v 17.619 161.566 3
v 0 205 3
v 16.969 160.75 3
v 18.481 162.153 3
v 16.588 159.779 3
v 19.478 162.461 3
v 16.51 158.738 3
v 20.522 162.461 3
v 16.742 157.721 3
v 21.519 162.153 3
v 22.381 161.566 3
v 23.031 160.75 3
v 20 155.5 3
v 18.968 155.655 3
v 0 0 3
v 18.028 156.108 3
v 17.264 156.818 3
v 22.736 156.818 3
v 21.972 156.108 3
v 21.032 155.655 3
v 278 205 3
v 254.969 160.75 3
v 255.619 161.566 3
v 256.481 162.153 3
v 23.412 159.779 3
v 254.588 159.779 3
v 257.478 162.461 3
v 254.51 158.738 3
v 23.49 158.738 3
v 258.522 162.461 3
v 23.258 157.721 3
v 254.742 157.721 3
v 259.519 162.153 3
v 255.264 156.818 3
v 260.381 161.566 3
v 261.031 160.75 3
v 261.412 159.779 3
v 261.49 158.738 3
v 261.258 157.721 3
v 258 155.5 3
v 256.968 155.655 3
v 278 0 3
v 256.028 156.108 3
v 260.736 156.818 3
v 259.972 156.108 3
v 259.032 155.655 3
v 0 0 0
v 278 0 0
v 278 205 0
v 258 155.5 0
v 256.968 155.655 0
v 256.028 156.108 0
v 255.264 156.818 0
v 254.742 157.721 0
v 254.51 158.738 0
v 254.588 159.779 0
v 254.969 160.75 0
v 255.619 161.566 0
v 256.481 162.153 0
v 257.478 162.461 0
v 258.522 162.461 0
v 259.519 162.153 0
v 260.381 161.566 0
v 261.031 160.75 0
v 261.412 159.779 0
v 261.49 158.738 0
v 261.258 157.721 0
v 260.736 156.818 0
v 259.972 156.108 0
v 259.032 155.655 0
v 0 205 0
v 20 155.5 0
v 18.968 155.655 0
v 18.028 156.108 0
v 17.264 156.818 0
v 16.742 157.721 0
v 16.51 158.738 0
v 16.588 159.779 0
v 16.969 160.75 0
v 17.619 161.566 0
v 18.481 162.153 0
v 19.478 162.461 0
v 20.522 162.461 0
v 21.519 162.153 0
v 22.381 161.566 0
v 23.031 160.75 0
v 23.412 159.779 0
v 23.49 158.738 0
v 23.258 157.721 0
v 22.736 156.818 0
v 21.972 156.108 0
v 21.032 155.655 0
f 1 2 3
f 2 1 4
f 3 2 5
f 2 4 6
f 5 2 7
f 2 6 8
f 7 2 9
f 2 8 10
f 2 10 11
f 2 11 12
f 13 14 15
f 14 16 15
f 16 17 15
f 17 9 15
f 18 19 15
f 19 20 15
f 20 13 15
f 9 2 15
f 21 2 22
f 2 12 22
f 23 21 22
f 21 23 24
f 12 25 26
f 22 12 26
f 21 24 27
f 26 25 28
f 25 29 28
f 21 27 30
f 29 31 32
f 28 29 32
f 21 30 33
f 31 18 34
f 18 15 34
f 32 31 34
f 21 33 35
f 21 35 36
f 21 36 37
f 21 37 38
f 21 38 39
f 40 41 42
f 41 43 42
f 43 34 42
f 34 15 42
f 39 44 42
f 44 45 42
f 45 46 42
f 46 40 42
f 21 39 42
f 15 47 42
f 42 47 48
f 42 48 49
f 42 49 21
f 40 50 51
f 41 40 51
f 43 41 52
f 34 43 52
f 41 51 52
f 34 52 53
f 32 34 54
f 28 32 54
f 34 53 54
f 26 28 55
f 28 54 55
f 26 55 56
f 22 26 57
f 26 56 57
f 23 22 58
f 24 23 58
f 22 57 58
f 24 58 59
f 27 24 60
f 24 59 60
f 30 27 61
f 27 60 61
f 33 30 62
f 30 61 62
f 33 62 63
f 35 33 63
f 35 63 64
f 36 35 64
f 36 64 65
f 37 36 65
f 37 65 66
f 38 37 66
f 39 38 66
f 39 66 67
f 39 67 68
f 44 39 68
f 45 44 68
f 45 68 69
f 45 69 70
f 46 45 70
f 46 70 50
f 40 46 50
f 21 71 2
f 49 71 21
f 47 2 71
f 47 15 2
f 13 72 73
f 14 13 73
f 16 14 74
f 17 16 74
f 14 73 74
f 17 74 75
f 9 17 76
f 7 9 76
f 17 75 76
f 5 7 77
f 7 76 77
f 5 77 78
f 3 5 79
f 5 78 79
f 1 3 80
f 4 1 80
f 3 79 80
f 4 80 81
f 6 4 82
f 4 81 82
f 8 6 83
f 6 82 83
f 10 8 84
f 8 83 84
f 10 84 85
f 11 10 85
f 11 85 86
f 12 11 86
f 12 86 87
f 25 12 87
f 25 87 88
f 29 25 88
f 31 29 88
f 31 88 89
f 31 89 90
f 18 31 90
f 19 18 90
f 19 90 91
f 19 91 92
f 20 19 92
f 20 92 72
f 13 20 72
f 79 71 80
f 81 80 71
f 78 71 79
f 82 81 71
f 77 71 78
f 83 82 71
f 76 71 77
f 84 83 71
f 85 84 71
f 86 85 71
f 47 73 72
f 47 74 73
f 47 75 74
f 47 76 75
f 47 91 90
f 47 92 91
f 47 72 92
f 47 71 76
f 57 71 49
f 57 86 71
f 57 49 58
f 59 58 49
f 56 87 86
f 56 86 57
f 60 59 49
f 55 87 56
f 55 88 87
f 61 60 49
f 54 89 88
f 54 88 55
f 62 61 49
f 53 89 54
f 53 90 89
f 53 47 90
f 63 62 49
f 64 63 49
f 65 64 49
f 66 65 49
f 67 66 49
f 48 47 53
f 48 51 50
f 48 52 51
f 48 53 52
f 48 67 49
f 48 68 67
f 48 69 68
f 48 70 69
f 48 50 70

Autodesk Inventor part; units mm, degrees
ref_plane "YZ Plane" through (0, 0, 0) normal (1, 0, 0) x (0, 1, 0)
ref_plane "XZ Plane" through (0, 0, 0) normal (0, 1, 0) x (-1, 0, 0)
ref_plane "XY Plane" through (0, 0, 0) normal (0, 0, 1) x (1, 0, 0)
sketch "Sketch1" plane through (0, 0, 0) normal (0, 0, 1) x (1, 0, 0)
  line L0 (0, 0) -> (278, 0)
  line L1 (278, 0) -> (278, 179)
  line L2 (278, 179) -> (0, 179)
  line L3 (0, 179) -> (0, 0)
  dimension "d0" = 278
  dimension "d1" = 179
extrude "Extrusion1" add sketch "Sketch1" along normal blind 3
sketch "Sketch2" plane through (0, 0, 3) normal (0, 0, 1) x (1, 0, 0)
  line L0 (0, 179) -> (0, 0) projected
  line L1 (278, 179) -> (0, 179) projected
  line L2 (278, 0) -> (278, 179) projected
  point P0 (20, 159)
  point P1 (258, 159)
  dimension "d4" = 20
  dimension "d5" = 20
  dimension "d6" = 20
  dimension "d7" = 20
hole "Hole1" at (20, 159, 3) at (258, 159, 3) direction (0, 0, -1) diameter 7 end through all
sketch "Sketch6" plane through (0, 179, 0) normal (0, 1, 0) x (1, 0, 0)
  line L0 (0, 0) -> (278, 0) projected
  line L1 (0, -3) -> (278, -3) projected
  line L2 (0, 0) -> (278, 0)
  line L3 (278, 0) -> (278, -3)
  line L4 (278, -3) -> (0, -3)
  line L5 (0, -3) -> (0, 0)
extrude "Extrusion2" add sketch "Sketch6" along normal blind 26
sketch "Sketch7" plane through (0, 0, 0) normal (0, 0, -1) x (-1, 0, 0)
  circle A0 centre (-92.17, 33.13) radius 1.5875 projected
  circle A1 centre (-165.83, 33.13) radius 1.5875 projected
  circle A2 centre (-166.592, 118.855) radius 1.5875 projected
  circle A3 centre (-88.36, 118.855) radius 1.5875 projected
  circle A4 centre (-8.5, 51.55) radius 1.6 projected
  circle A5 centre (-72.5, 51.55) radius 1.6 projected
  circle A6 centre (-72.5, 142.5) radius 1.6 projected
  circle A7 centre (-8.5, 142.5) radius 1.6 projected
  circle A8 centre (-86.6, 132.5) radius 1.6 projected
  circle A9 centre (-86.6, 196.5) radius 1.6 projected
  circle A10 centre (-177.55, 196.5) radius 1.6 projected
  circle A11 centre (-177.55, 132.5) radius 1.6 projected
  circle A12 centre (-184.55, 132.5) radius 1.6 projected
  circle A13 centre (-184.55, 196.5) radius 1.6 projected
  circle A14 centre (-275.5, 196.5) radius 1.6 projected
  circle A15 centre (-275.5, 132.5) radius 1.6 projected
  circle A16 centre (-275.5, 113.5) radius 1.6 projected
  circle A17 centre (-275.5, 49.5) radius 1.6 projected
  circle A18 centre (-184.55, 49.5) radius 1.6 projected
  circle A19 centre (-184.55, 113.5) radius 1.6 projected
  line L0 (0, 0) -> (-278, 0) projected
  line L1 (0, 0) -> (0, 205) projected
  line L2 (-278, 205) -> (0, 205) projected
  line L3 (-278, 0) -> (-278, 205) projected
  dimension "d41" = 33.13
  dimension "d42" = 51.55
  dimension "d43" = 51.55
  dimension "d44" = 8.5
  dimension "d45" = 72.5
  dimension "d46" = 88.36
  dimension "d47" = 92.17
  dimension "d48" = 165.83
  dimension "d49" = 166.592
  dimension "d50" = 86.6
  dimension "d51" = 177.55
  dimension "d52" = 8.5
  dimension "d53" = 72.5
  dimension "d54" = 2.5
  dimension "d55" = 93.45
  dimension "d56" = 91.5
  dimension "d57" = 155.5
  dimension "d58" = 118.855
properties part number "SupportsheetADCS2" material "Aluminum 6061"
